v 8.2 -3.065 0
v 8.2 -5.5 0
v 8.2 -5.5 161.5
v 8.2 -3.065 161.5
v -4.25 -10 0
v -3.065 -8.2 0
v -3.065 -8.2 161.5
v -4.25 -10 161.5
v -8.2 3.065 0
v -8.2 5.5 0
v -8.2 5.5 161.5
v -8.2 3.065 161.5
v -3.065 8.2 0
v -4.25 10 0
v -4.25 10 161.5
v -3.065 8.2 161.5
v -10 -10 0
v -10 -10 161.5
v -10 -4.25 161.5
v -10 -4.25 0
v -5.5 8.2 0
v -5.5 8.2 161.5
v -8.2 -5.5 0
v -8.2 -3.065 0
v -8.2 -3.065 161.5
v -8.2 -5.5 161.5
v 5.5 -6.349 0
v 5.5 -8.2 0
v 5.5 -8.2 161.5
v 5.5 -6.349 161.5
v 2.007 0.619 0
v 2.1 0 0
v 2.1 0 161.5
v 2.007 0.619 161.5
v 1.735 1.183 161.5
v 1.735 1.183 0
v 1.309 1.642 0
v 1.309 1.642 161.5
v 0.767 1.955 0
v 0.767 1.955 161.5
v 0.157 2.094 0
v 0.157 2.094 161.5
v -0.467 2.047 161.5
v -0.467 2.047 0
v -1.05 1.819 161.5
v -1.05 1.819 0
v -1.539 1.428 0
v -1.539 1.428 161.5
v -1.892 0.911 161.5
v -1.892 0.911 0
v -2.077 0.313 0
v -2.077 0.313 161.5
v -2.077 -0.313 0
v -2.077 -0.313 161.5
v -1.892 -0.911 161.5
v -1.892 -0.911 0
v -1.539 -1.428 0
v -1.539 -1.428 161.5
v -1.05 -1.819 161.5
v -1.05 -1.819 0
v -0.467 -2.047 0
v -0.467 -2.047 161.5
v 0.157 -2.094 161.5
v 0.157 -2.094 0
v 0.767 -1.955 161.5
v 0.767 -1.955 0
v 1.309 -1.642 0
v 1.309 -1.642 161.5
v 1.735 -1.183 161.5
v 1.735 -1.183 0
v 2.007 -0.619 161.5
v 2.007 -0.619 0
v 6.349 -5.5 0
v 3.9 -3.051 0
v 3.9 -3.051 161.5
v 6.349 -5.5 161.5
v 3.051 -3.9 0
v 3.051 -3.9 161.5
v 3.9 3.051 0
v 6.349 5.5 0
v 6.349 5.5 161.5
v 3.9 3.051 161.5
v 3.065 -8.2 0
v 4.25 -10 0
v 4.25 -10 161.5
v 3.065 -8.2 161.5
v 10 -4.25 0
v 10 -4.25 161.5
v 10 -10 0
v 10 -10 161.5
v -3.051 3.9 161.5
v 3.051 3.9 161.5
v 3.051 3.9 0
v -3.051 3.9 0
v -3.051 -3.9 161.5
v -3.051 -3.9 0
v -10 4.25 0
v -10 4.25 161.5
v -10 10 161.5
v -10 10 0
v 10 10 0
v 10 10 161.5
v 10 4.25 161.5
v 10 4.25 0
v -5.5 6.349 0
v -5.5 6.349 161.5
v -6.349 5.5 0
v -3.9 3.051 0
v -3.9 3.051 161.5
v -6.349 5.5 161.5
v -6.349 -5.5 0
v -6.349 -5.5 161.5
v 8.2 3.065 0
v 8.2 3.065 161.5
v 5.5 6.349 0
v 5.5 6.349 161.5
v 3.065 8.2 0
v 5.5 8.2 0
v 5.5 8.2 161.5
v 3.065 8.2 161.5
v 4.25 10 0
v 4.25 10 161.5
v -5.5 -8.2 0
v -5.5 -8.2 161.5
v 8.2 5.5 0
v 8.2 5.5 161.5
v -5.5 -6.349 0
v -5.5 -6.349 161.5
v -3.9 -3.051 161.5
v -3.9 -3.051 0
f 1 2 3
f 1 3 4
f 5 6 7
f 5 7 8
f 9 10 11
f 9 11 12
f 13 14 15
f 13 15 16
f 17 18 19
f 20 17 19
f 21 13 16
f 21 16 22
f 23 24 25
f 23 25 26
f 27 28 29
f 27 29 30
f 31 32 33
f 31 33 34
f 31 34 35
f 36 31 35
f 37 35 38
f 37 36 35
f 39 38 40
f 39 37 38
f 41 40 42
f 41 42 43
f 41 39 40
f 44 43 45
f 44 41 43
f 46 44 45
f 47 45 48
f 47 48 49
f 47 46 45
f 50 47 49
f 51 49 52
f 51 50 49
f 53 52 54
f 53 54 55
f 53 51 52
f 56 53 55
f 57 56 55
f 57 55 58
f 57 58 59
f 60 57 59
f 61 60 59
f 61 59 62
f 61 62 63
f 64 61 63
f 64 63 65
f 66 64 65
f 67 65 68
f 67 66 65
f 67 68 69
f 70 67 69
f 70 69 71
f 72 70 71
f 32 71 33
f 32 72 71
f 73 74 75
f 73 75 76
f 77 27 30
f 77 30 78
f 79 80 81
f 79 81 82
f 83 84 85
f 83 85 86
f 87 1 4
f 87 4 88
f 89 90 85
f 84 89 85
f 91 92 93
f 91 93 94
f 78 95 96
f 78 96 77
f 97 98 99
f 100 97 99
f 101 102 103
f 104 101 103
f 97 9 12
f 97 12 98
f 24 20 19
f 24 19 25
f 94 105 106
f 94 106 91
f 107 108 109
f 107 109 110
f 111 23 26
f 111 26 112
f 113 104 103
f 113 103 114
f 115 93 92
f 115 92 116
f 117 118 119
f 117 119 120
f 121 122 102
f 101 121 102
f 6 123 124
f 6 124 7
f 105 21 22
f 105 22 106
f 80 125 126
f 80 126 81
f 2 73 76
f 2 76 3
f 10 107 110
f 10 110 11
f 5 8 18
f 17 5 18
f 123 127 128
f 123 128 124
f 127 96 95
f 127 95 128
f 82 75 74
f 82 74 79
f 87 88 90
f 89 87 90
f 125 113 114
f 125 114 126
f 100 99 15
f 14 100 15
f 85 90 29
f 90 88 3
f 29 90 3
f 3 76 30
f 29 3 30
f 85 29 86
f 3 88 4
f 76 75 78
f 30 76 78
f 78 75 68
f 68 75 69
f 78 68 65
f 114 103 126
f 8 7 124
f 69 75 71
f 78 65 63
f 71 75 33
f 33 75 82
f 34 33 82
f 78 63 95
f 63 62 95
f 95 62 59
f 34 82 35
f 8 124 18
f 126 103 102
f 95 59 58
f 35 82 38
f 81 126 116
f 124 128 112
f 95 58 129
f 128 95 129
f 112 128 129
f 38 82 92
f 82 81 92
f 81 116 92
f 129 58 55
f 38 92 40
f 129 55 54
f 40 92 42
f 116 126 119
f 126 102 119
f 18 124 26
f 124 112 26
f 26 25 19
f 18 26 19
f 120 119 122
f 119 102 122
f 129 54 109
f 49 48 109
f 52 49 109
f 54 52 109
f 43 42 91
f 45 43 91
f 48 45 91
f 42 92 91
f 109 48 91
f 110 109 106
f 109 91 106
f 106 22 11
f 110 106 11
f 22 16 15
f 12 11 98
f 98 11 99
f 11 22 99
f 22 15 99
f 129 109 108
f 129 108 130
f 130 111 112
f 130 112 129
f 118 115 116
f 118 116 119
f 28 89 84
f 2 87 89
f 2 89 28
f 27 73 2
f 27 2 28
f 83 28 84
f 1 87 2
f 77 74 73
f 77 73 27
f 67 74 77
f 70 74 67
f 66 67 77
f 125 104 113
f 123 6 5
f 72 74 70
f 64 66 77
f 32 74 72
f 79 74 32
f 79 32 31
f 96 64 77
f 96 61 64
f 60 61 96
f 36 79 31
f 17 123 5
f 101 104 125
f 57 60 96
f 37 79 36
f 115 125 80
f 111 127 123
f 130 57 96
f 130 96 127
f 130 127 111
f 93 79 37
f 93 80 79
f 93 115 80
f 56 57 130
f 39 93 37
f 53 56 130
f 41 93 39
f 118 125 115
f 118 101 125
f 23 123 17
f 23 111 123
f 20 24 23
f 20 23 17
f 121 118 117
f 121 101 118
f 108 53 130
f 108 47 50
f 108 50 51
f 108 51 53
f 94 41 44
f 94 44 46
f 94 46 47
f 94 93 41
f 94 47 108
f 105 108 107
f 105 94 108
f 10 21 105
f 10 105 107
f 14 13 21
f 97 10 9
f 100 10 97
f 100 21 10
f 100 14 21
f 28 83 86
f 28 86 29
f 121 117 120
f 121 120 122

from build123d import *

# Parameters (mm, degrees)
SKETCH1_R           = 2.1
BOSS_EXTRUDE1_DEPTH = 161.5


with BuildPart() as part:
    # Sketch1 → Boss-Extrude1 (new body)
    with BuildSketch(Plane.XY):
        Polygon((-10, 10), (-4.25, 10), (-3.065, 8.2), (-5.5, 8.2), (-5.5, 6.348528137), (-3.051471863, 3.9), (0, 3.9), (3.051471863, 3.9), (5.5, 6.348528137), (5.5, 8.2), (3.065, 8.2), (4.25, 10), (10, 10), (10, 4.25), (8.2, 3.065), (8.2, 5.5), (6.348528137, 5.5), (3.9, 3.051471863), (3.9, 0), (3.9, -3.051471863), (6.348528137, -5.5), (8.2, -5.5), (8.2, -3.065), (10, -4.25), (10, -10), (4.25, -10), (3.065, -8.2), (5.5, -8.2), (5.5, -6.348528137), (3.051471863, -3.9), (0, -3.9), (-3.051471863, -3.9), (-5.5, -6.348528137), (-5.5, -8.2), (-3.065, -8.2), (-4.25, -10), (-10, -10), (-10, -4.25), (-8.2, -3.065), (-8.2, -5.5), (-6.348528137, -5.5), (-3.9, -3.051471863), (-3.9, 0), (-3.9, 3.051471863), (-6.348528137, 5.5), (-8.2, 5.5), (-8.2, 3.065), (-10, 4.25), align=None)
        Circle(SKETCH1_R, mode=Mode.SUBTRACT)
    extrude(amount=BOSS_EXTRUDE1_DEPTH)


solid = part.part
